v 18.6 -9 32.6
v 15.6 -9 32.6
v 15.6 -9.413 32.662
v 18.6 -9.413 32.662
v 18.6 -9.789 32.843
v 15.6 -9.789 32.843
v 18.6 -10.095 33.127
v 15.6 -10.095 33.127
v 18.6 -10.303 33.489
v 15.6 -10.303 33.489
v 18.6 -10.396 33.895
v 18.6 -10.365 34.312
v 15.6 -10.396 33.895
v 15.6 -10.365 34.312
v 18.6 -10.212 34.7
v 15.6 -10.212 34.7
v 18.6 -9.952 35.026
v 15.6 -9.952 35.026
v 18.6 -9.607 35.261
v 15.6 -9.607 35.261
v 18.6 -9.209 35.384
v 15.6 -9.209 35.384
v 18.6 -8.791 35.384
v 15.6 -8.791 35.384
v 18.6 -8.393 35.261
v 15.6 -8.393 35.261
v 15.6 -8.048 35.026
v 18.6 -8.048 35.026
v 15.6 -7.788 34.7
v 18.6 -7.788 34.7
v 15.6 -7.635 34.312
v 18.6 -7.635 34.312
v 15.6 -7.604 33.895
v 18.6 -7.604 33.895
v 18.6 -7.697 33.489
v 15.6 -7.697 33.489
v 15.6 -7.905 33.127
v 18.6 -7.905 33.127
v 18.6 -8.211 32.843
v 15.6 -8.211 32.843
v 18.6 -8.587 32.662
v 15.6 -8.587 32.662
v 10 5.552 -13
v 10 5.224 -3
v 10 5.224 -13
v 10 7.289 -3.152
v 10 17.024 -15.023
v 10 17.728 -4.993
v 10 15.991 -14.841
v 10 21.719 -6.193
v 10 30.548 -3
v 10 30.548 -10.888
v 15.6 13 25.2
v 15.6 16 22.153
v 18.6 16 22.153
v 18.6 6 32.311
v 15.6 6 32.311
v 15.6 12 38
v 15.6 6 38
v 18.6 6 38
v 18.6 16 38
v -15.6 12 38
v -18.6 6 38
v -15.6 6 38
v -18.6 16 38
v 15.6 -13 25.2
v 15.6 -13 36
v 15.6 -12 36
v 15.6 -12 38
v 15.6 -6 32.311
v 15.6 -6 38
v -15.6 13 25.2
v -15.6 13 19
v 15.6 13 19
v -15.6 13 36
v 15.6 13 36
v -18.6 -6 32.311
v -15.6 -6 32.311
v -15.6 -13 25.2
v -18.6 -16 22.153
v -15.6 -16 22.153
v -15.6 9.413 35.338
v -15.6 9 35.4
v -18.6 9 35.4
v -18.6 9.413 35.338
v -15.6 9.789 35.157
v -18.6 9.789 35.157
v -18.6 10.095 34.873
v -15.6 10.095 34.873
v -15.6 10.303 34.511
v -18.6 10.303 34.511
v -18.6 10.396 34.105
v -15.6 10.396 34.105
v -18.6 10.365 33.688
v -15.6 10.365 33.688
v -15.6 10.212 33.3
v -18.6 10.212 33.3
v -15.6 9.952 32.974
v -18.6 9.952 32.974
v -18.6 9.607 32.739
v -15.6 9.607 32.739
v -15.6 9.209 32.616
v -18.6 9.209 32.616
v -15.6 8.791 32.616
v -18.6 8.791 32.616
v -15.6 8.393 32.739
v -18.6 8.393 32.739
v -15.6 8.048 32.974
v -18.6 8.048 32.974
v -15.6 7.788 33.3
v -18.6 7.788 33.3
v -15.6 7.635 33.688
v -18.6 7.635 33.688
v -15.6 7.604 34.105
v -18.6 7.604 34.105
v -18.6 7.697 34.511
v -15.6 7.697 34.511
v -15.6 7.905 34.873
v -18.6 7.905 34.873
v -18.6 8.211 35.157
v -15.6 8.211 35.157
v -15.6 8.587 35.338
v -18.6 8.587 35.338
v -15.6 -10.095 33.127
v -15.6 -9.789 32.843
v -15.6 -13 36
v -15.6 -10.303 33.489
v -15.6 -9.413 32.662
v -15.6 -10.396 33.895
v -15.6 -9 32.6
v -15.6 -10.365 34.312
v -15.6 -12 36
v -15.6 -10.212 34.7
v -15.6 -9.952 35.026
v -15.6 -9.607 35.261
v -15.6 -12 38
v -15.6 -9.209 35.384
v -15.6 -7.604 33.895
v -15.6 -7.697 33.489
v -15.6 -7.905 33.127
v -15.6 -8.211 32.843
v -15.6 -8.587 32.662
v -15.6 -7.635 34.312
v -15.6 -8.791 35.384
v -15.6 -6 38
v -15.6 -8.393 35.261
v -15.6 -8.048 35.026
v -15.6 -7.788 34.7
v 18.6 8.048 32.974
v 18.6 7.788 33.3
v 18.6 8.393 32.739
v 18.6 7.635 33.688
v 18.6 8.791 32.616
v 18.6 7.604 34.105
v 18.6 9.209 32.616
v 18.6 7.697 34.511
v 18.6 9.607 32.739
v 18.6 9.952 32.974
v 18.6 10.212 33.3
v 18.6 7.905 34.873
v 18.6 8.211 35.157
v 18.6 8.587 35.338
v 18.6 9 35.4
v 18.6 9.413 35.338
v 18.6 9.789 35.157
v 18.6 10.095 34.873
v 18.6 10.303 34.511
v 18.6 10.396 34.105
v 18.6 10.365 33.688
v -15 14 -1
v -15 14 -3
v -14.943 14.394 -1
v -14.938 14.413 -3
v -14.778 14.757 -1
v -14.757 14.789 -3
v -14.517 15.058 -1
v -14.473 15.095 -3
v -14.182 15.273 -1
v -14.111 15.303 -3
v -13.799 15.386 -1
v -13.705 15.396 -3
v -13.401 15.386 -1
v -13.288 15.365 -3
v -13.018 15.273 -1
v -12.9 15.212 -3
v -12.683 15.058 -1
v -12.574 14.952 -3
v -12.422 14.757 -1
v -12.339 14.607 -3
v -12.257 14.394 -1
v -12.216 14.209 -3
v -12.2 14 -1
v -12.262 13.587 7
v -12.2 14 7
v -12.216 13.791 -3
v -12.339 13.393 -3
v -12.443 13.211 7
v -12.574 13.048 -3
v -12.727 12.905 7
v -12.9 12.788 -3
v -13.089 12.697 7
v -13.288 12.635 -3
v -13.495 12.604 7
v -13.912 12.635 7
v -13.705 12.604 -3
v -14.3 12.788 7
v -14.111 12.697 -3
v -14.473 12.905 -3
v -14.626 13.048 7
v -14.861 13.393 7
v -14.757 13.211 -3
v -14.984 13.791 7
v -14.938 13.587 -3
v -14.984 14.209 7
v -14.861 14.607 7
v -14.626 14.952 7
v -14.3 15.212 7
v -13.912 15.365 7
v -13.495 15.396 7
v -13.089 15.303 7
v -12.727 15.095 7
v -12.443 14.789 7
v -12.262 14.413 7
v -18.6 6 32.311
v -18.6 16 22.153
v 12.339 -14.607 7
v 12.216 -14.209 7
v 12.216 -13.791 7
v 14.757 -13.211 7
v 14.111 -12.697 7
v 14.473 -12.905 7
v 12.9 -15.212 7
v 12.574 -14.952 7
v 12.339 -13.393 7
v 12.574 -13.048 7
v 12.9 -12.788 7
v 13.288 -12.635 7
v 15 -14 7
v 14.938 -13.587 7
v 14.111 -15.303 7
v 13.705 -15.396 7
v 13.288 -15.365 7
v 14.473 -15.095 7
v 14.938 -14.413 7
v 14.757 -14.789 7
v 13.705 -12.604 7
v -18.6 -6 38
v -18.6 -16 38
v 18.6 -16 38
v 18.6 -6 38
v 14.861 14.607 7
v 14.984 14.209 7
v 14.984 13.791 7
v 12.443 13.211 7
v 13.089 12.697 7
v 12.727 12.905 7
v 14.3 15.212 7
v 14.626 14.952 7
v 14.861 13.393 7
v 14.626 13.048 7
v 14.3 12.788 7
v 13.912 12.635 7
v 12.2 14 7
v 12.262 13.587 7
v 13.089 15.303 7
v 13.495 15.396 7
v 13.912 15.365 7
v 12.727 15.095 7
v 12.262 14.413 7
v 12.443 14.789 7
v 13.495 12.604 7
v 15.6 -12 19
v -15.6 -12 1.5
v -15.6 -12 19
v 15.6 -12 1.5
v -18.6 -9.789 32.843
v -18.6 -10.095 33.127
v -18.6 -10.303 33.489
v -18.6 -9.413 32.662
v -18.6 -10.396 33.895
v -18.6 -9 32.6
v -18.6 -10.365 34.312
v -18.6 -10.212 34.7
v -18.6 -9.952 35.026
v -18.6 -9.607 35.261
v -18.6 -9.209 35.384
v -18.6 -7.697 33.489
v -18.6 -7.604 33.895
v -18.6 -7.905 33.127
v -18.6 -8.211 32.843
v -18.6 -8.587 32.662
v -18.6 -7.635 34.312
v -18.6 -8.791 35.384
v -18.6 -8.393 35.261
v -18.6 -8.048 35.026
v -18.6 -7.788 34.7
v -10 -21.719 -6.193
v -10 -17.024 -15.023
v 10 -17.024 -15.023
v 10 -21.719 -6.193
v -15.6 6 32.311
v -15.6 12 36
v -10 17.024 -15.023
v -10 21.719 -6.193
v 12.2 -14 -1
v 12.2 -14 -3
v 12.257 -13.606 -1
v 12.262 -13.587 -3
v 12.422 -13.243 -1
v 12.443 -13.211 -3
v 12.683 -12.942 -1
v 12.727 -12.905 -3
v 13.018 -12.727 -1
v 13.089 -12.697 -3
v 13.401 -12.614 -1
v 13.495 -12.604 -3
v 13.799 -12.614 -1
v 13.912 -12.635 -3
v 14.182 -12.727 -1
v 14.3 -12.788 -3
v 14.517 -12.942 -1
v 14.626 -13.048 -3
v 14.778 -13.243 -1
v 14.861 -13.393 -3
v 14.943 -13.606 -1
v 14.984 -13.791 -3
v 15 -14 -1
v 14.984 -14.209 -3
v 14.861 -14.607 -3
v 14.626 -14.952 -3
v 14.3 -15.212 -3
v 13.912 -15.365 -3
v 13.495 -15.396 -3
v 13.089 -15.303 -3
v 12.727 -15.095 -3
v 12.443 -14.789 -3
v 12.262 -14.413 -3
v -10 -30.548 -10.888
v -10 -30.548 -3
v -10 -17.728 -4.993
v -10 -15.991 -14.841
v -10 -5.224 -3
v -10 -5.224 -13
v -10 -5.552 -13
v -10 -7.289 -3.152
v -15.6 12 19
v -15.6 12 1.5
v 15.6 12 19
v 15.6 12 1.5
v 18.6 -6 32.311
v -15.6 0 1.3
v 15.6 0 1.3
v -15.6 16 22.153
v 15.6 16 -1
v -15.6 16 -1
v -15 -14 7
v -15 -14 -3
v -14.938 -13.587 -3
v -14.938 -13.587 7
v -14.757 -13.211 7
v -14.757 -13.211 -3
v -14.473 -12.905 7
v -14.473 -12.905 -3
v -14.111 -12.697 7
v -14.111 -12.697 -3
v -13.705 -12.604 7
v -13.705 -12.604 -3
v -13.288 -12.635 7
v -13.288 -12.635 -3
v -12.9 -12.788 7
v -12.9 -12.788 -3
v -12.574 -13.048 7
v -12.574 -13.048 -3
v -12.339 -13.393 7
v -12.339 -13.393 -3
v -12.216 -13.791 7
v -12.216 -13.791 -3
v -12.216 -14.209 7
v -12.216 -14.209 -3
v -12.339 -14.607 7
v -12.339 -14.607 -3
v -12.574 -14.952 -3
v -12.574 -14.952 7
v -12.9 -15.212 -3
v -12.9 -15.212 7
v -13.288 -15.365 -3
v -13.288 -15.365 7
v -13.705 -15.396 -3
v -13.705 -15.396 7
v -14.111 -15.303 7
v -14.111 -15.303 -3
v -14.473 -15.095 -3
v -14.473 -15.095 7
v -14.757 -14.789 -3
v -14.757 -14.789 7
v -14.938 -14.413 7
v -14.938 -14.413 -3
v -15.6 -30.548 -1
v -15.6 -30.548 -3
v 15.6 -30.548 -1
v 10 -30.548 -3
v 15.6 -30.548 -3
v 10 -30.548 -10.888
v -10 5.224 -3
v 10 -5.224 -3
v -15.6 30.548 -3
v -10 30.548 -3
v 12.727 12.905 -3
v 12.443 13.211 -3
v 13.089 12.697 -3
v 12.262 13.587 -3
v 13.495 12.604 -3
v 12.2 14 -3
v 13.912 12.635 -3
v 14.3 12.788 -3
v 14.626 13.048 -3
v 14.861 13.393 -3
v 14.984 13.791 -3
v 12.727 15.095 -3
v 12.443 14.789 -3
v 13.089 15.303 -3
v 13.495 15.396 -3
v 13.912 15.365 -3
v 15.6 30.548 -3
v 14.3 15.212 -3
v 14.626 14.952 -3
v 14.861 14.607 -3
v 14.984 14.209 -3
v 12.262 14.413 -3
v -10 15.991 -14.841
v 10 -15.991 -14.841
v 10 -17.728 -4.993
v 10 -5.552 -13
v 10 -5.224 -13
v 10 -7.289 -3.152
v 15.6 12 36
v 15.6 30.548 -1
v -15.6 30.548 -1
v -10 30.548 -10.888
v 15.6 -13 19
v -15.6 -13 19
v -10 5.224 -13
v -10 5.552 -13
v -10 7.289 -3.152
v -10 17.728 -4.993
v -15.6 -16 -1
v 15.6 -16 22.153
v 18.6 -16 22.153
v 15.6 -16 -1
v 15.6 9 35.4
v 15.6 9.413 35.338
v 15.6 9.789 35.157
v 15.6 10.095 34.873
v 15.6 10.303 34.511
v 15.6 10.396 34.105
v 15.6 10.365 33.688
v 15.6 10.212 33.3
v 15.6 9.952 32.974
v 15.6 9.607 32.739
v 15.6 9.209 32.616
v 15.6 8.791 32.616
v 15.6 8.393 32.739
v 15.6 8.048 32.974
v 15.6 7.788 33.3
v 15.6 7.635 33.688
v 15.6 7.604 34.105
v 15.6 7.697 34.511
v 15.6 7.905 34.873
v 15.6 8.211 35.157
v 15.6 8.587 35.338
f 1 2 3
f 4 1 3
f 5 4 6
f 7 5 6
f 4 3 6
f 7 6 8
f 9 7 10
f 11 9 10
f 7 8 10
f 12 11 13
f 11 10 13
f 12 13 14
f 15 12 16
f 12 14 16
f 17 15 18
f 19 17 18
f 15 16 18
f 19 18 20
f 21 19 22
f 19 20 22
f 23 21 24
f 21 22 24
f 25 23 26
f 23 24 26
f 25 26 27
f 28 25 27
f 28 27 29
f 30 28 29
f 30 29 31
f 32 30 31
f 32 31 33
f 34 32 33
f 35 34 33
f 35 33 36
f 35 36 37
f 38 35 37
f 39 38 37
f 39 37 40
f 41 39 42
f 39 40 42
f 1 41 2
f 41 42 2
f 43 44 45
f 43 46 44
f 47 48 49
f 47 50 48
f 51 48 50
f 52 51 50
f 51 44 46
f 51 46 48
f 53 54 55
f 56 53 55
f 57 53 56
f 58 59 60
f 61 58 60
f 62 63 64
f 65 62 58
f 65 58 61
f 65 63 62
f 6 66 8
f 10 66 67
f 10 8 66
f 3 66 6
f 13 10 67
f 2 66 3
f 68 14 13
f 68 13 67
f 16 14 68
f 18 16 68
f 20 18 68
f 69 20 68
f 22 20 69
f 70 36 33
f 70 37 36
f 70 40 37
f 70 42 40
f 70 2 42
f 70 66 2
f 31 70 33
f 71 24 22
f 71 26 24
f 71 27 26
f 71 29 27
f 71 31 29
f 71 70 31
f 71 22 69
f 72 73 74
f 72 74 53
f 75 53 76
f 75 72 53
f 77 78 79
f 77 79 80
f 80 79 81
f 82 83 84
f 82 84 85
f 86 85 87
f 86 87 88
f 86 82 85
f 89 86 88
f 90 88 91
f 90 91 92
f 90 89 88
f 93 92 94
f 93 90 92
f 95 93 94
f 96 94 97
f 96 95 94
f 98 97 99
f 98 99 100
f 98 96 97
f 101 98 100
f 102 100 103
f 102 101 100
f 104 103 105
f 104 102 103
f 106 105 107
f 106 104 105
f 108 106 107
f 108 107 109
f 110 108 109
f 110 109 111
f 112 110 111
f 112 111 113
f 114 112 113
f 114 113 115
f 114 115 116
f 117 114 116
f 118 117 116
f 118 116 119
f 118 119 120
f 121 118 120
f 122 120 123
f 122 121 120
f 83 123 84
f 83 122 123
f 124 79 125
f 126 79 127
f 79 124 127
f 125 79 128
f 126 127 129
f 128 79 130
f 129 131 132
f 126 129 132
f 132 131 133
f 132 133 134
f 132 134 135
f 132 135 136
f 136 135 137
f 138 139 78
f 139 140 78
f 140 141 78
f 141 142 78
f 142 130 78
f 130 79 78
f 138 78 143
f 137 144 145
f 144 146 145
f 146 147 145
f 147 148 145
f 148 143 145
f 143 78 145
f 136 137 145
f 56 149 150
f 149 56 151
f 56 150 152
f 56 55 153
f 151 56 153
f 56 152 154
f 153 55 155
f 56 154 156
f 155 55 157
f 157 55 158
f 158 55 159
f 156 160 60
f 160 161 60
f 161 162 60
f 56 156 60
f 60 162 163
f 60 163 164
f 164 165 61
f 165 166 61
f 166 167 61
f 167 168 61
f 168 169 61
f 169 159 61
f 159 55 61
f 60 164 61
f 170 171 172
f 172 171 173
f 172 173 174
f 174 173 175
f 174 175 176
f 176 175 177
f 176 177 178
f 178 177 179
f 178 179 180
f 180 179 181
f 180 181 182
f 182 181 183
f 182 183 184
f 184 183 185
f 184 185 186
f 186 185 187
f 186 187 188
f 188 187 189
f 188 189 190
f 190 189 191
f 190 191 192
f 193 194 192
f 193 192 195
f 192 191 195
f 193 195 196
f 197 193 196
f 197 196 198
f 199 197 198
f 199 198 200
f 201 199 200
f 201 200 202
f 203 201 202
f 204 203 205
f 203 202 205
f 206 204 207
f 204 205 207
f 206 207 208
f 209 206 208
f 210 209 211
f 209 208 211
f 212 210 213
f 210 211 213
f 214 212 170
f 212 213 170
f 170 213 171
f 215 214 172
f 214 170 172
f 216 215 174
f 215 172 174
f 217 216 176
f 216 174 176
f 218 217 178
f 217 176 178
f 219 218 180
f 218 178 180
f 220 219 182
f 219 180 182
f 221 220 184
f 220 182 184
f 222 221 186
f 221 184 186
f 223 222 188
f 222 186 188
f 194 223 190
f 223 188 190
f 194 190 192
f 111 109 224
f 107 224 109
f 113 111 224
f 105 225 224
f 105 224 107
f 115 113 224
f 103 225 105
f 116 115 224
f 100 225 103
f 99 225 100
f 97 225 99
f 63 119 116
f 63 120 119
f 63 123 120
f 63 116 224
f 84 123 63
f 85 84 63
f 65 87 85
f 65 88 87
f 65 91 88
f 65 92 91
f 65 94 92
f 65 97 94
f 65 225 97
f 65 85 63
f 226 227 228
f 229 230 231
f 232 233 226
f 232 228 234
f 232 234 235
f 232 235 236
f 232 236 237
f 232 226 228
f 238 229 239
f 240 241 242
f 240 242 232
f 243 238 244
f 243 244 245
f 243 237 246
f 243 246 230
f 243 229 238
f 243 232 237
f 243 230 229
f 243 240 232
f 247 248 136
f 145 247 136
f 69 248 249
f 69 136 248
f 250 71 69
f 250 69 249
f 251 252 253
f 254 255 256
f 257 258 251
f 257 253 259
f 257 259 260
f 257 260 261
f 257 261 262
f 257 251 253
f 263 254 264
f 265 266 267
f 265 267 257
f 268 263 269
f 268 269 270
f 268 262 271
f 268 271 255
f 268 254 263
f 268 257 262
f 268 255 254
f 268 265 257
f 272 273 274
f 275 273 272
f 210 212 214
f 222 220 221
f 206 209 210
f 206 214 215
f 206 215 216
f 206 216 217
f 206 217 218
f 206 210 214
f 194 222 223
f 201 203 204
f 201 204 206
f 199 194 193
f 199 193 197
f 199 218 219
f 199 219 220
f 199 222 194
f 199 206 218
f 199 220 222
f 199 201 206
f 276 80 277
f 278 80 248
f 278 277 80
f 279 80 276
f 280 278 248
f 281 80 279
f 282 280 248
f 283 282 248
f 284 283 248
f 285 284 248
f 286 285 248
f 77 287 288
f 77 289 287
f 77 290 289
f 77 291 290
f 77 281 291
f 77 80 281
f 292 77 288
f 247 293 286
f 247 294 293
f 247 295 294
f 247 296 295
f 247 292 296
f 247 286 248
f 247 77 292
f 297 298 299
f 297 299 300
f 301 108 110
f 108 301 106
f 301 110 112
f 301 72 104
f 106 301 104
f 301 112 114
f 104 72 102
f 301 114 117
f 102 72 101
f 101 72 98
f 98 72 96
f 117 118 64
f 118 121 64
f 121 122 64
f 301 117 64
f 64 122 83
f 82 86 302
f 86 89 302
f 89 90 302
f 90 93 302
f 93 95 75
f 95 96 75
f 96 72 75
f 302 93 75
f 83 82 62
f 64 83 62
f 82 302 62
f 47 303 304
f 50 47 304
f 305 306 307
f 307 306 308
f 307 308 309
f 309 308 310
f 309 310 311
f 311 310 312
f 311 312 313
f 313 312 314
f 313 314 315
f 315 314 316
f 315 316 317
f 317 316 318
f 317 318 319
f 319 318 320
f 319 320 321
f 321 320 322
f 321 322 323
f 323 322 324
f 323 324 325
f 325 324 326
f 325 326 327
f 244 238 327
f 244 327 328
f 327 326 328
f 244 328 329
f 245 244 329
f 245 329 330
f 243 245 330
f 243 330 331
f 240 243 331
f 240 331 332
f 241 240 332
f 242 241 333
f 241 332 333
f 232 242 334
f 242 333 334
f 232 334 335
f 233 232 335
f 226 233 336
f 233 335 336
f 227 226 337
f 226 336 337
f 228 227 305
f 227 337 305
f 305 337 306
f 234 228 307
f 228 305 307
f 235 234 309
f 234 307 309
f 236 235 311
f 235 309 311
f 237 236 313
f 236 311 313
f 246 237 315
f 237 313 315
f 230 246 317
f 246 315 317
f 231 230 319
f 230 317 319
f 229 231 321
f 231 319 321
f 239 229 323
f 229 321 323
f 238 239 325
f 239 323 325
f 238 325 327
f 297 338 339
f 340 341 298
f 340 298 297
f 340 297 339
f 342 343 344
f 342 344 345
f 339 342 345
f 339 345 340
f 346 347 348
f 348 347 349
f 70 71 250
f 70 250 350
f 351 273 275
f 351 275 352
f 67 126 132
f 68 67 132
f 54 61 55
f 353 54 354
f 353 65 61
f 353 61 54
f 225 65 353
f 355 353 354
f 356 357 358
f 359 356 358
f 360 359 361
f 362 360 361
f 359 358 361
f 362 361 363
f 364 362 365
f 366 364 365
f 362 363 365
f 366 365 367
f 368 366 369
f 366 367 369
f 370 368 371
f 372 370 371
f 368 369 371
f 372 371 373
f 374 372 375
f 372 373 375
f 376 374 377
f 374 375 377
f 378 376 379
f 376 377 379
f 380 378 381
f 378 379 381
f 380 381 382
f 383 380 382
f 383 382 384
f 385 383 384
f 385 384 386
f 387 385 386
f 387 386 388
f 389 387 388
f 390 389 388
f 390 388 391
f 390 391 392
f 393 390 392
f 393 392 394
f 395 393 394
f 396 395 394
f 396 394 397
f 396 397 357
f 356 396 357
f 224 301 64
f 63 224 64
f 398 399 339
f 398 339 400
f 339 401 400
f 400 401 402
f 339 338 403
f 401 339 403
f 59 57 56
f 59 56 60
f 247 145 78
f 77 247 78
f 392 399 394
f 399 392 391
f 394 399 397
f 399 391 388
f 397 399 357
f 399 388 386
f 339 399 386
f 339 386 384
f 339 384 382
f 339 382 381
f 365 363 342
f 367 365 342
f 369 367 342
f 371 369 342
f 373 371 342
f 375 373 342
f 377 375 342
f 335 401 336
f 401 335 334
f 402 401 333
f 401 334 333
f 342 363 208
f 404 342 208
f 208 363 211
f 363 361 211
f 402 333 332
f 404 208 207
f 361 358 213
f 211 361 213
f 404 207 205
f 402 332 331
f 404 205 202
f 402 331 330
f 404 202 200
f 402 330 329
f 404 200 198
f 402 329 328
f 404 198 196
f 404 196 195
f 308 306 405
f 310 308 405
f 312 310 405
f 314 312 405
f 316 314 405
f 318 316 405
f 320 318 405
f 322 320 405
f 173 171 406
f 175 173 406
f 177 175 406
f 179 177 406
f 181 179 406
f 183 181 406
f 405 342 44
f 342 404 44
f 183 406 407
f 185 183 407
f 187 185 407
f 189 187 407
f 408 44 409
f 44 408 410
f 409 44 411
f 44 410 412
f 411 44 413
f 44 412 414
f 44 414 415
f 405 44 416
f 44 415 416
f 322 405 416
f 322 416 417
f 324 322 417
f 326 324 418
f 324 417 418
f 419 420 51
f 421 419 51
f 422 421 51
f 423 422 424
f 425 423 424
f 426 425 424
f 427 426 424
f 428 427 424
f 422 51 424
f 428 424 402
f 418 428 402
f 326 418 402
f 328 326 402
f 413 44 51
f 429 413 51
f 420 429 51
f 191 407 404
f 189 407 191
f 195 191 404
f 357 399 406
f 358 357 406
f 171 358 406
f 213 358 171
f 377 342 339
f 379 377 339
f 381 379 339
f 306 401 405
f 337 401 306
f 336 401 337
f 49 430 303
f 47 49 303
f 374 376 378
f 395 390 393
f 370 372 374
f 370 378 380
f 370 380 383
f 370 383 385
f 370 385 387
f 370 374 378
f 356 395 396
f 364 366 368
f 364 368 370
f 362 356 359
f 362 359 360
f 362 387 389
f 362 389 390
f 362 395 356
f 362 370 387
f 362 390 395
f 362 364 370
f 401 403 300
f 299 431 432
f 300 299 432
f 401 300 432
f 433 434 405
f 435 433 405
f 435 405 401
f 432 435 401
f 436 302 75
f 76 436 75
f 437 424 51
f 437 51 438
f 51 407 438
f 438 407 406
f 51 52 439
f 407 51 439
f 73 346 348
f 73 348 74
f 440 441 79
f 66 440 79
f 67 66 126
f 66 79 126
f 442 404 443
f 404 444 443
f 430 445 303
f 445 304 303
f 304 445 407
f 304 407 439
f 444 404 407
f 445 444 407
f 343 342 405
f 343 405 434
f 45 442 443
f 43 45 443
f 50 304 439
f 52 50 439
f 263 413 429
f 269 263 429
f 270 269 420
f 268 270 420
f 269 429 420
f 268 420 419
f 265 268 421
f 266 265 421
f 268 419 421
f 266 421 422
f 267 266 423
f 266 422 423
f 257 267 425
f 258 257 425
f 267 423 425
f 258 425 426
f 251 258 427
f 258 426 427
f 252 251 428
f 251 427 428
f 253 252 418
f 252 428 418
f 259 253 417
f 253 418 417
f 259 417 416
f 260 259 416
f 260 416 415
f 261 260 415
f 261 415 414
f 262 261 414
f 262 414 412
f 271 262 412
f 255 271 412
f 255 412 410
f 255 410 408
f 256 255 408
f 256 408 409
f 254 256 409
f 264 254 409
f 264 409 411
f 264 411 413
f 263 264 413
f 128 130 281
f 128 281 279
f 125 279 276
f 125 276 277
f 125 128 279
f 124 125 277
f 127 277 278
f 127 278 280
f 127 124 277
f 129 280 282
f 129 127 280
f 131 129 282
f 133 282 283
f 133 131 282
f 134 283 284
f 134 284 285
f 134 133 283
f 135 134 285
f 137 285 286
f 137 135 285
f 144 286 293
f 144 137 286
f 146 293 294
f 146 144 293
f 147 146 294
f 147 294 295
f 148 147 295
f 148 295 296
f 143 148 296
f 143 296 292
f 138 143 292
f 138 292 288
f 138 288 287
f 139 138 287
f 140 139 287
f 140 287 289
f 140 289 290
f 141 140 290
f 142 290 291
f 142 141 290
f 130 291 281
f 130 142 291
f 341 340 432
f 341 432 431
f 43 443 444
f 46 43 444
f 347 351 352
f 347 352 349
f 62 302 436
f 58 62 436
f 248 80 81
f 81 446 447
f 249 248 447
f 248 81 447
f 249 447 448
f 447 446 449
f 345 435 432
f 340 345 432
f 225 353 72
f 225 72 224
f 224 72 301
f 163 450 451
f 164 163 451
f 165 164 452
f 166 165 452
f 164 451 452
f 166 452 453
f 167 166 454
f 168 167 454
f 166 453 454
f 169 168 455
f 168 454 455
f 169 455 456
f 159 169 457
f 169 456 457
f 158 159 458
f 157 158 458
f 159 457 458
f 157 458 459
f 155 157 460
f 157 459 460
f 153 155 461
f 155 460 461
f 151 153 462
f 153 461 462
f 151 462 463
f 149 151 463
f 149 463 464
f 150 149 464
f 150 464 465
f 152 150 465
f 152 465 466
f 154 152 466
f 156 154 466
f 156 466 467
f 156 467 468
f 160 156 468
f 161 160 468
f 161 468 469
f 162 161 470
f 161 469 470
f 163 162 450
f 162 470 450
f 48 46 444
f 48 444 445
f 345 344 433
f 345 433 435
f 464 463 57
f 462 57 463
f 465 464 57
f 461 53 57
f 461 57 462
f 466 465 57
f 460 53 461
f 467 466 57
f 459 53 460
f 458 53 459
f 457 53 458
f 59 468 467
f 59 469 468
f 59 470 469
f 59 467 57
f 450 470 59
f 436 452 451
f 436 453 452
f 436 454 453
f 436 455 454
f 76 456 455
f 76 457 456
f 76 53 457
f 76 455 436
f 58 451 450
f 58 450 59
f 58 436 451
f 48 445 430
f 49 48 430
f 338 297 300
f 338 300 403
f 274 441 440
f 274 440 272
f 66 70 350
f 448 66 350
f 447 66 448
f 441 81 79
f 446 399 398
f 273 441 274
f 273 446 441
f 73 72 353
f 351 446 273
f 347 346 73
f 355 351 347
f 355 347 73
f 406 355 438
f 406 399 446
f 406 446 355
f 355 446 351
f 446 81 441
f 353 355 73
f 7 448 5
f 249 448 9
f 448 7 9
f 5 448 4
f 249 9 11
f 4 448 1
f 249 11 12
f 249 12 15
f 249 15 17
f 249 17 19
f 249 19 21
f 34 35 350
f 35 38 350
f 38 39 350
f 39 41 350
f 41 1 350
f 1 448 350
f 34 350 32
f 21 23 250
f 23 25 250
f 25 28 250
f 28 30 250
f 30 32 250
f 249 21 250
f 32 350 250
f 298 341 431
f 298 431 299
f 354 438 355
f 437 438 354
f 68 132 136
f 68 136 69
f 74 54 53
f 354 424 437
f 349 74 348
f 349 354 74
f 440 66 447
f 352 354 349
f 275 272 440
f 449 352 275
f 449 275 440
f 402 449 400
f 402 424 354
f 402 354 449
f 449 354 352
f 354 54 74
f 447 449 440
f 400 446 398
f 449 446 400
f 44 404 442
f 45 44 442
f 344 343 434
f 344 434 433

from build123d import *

# Parameters (mm, degrees)
EXTRUDE_1_DEPTH      = 2
EXTRUDE_1_DEPTH_BACK = 1
SKETCH_1_W           = 31.2
SKETCH_1_H           = 24
EXTRUDE_2_DEPTH      = 36
EXTRUDE_2_DEPTH_BACK = 3
SKETCH_2_W           = 31.2
SKETCH_2_H           = 4
SKETCH_3_R           = 1.4
EXTRUDE_3_DEPTH      = 3
SKETCH_4_R           = 1.4
CUT_EXTRUDE_1_DEPTH  = 8
SKETCH_5_W           = 17
SKETCH_5_H           = 1
CUT_EXTRUDE_2_DEPTH  = 31.2
CUT_EXTRUDE_3_DEPTH  = 31.2
EXTRUDE_START        = 2
SKETCH_7_R           = 1.4
EXTRUDE_4_DEPTH      = 2
EXTRUDE_5_DEPTH      = 10
EXTRUDE_5_DEPTH_BACK = 10
CUT_EXTRUDE_4_DEPTH  = 10


with BuildPart() as part:
    # 草图1 → 凸台-拉伸1 (new, two sides: drawn at the far end of the back side and taken through both)
    with BuildSketch(Plane.XY.offset(-EXTRUDE_1_DEPTH_BACK)):
        Rectangle(SKETCH_1_W, SKETCH_1_H)
    extrude(amount=EXTRUDE_1_DEPTH + EXTRUDE_1_DEPTH_BACK)

    # 草图2 → 凸台-拉伸2 (add, two sides: drawn at the far end of the back side and taken through both)
    with BuildSketch(Plane.XY.offset(2).offset(-EXTRUDE_2_DEPTH_BACK)):
        with Locations((0, 14)):
            Rectangle(SKETCH_2_W, SKETCH_2_H)
        with Locations((0, -14)):
            Rectangle(SKETCH_2_W, SKETCH_2_H)
    extrude(amount=EXTRUDE_2_DEPTH + EXTRUDE_2_DEPTH_BACK)

    # 草图3 → 凸台-拉伸3 (add)
    # profile 1 of 2: a face of its own
    with BuildSketch(Plane.ZY.offset(15.6)):
        Polygon((38, 16), (31, 16), (22.152932489, 16), (32.310715372, 6), (38, 6), align=None)
        with Locations((34, 9)):
            Circle(SKETCH_3_R, mode=Mode.SUBTRACT)
    # profile 2 of 2: a face of its own
    with BuildSketch(Plane.ZY.offset(15.6)):
        Polygon((38, -16), (38, -6), (32.310715372, -6), (22.152932489, -16), (31, -16), align=None)
        with Locations(Location((34, -9, 0), (0, 0, 180))):
            Circle(SKETCH_3_R, mode=Mode.SUBTRACT)
    extrude_3 = extrude(amount=EXTRUDE_3_DEPTH)

    # 草图4 → 切除-拉伸1 (cut)
    with BuildSketch(Plane(origin=(0, 0, -1), x_dir=(-1, 0, 0), z_dir=(0, 0, -1))):
        with Locations((13.6, -14)):
            Circle(SKETCH_4_R)
        with Locations(Location((13.6, 14, 0), (0, 0, 180))):
            Circle(SKETCH_4_R)
        with Locations(Location((-13.6, -14, 0), (0, 0, 180))):
            Circle(SKETCH_4_R)
        with Locations((-13.6, 14)):
            Circle(SKETCH_4_R)
    extrude(amount=-CUT_EXTRUDE_1_DEPTH, mode=Mode.SUBTRACT)

    # 镜向1: 凸台-拉伸3 across plane
    add(extrude_3.mirror(Plane(origin=(0, 0, 0), x_dir=(0, 0, 1), z_dir=(1, 0, 0))))

    # 草图5 → 切除-拉伸2 (cut)
    with BuildSketch(Plane.ZY.offset(15.6)):
        with Locations((27.5, 12.5)):
            Rectangle(SKETCH_5_W, SKETCH_5_H)
        with Locations((27.5, -12.5)):
            Rectangle(SKETCH_5_W, SKETCH_5_H)
    extrude(amount=-CUT_EXTRUDE_2_DEPTH, mode=Mode.SUBTRACT)

    # 草图6 → 切除-拉伸3 (cut)
    with BuildSketch(Plane.ZY.offset(15.6)):
        Polygon((1.3, 0), (1.5, 12), (2, 12), (2, -12), (1.5, -12), align=None)
    extrude(amount=-CUT_EXTRUDE_3_DEPTH, mode=Mode.SUBTRACT)

    # 草图7 → 凸台-拉伸4 (add)
    with BuildSketch(Plane(origin=(0, 0, -1), x_dir=(-1, 0, 0), z_dir=(0, 0, -1)).offset(EXTRUDE_START)):
        Polygon((-15.6, -16), (-15.6, 16), (-15.6, 36), (15.6, 36), (15.6, 16), (15.6, -16), (15.6, -36), (-15.6, -36), align=None)
        with Locations((-13.6, -14)):
            Circle(SKETCH_7_R, mode=Mode.SUBTRACT)
        with Locations((-13.6, 14)):
            Circle(SKETCH_7_R, mode=Mode.SUBTRACT)
        with Locations((13.6, 14)):
            Circle(SKETCH_7_R, mode=Mode.SUBTRACT)
        with Locations((13.6, -14)):
            Circle(SKETCH_7_R, mode=Mode.SUBTRACT)
    extrude(amount=-EXTRUDE_4_DEPTH)

    # 草图8 → 凸台-拉伸5 (add, two sides: drawn at the far end of the back side and taken through both)
    with BuildSketch(Plane(origin=(0, 0, 0), x_dir=(0, 0, -1), z_dir=(1, 0, 0)).offset(-EXTRUDE_5_DEPTH_BACK)):
        Polygon((6.193279754, 21.718771198), (10.887995382, 30.548247127), (3, 30.548247127), (3, 5.223875299), (13, 5.223875299), (13, 5.552438043), (3.15192247, 7.288919819), (4.992593153, 17.727882001), (14.840670683, 15.991400225), (15.022755683, 17.024055571), align=None)
        Polygon((10.887995382, -30.548247127), (3, -30.548247127), (3, -5.223875299), (13, -5.223875299), (13, -5.552438043), (3.15192247, -7.288919819), (4.992593153, -17.727882001), (14.840670683, -15.991400225), (15.022755683, -17.024055571), (6.193279754, -21.718771198), align=None)
    extrude(amount=EXTRUDE_5_DEPTH + EXTRUDE_5_DEPTH_BACK)

    # 草图9 → 切除-拉伸4 (cut)
    with BuildSketch(Plane(origin=(0, 0, -3), x_dir=(-1, 0, 0), z_dir=(0, 0, -1))):
        Polygon((15.6, 36), (-10, 36), (-15.6, 36), (-15.6, 30.548247127), (-10, 30.548247127), (15.6, 30.548247127), align=None)
        Polygon((15.6, -36), (-10, -36), (-15.6, -36), (-15.6, -30.548247127), (-10, -30.548247127), (15.6, -30.548247127), align=None)
    extrude(amount=-CUT_EXTRUDE_4_DEPTH, mode=Mode.SUBTRACT)


solid = part.part
